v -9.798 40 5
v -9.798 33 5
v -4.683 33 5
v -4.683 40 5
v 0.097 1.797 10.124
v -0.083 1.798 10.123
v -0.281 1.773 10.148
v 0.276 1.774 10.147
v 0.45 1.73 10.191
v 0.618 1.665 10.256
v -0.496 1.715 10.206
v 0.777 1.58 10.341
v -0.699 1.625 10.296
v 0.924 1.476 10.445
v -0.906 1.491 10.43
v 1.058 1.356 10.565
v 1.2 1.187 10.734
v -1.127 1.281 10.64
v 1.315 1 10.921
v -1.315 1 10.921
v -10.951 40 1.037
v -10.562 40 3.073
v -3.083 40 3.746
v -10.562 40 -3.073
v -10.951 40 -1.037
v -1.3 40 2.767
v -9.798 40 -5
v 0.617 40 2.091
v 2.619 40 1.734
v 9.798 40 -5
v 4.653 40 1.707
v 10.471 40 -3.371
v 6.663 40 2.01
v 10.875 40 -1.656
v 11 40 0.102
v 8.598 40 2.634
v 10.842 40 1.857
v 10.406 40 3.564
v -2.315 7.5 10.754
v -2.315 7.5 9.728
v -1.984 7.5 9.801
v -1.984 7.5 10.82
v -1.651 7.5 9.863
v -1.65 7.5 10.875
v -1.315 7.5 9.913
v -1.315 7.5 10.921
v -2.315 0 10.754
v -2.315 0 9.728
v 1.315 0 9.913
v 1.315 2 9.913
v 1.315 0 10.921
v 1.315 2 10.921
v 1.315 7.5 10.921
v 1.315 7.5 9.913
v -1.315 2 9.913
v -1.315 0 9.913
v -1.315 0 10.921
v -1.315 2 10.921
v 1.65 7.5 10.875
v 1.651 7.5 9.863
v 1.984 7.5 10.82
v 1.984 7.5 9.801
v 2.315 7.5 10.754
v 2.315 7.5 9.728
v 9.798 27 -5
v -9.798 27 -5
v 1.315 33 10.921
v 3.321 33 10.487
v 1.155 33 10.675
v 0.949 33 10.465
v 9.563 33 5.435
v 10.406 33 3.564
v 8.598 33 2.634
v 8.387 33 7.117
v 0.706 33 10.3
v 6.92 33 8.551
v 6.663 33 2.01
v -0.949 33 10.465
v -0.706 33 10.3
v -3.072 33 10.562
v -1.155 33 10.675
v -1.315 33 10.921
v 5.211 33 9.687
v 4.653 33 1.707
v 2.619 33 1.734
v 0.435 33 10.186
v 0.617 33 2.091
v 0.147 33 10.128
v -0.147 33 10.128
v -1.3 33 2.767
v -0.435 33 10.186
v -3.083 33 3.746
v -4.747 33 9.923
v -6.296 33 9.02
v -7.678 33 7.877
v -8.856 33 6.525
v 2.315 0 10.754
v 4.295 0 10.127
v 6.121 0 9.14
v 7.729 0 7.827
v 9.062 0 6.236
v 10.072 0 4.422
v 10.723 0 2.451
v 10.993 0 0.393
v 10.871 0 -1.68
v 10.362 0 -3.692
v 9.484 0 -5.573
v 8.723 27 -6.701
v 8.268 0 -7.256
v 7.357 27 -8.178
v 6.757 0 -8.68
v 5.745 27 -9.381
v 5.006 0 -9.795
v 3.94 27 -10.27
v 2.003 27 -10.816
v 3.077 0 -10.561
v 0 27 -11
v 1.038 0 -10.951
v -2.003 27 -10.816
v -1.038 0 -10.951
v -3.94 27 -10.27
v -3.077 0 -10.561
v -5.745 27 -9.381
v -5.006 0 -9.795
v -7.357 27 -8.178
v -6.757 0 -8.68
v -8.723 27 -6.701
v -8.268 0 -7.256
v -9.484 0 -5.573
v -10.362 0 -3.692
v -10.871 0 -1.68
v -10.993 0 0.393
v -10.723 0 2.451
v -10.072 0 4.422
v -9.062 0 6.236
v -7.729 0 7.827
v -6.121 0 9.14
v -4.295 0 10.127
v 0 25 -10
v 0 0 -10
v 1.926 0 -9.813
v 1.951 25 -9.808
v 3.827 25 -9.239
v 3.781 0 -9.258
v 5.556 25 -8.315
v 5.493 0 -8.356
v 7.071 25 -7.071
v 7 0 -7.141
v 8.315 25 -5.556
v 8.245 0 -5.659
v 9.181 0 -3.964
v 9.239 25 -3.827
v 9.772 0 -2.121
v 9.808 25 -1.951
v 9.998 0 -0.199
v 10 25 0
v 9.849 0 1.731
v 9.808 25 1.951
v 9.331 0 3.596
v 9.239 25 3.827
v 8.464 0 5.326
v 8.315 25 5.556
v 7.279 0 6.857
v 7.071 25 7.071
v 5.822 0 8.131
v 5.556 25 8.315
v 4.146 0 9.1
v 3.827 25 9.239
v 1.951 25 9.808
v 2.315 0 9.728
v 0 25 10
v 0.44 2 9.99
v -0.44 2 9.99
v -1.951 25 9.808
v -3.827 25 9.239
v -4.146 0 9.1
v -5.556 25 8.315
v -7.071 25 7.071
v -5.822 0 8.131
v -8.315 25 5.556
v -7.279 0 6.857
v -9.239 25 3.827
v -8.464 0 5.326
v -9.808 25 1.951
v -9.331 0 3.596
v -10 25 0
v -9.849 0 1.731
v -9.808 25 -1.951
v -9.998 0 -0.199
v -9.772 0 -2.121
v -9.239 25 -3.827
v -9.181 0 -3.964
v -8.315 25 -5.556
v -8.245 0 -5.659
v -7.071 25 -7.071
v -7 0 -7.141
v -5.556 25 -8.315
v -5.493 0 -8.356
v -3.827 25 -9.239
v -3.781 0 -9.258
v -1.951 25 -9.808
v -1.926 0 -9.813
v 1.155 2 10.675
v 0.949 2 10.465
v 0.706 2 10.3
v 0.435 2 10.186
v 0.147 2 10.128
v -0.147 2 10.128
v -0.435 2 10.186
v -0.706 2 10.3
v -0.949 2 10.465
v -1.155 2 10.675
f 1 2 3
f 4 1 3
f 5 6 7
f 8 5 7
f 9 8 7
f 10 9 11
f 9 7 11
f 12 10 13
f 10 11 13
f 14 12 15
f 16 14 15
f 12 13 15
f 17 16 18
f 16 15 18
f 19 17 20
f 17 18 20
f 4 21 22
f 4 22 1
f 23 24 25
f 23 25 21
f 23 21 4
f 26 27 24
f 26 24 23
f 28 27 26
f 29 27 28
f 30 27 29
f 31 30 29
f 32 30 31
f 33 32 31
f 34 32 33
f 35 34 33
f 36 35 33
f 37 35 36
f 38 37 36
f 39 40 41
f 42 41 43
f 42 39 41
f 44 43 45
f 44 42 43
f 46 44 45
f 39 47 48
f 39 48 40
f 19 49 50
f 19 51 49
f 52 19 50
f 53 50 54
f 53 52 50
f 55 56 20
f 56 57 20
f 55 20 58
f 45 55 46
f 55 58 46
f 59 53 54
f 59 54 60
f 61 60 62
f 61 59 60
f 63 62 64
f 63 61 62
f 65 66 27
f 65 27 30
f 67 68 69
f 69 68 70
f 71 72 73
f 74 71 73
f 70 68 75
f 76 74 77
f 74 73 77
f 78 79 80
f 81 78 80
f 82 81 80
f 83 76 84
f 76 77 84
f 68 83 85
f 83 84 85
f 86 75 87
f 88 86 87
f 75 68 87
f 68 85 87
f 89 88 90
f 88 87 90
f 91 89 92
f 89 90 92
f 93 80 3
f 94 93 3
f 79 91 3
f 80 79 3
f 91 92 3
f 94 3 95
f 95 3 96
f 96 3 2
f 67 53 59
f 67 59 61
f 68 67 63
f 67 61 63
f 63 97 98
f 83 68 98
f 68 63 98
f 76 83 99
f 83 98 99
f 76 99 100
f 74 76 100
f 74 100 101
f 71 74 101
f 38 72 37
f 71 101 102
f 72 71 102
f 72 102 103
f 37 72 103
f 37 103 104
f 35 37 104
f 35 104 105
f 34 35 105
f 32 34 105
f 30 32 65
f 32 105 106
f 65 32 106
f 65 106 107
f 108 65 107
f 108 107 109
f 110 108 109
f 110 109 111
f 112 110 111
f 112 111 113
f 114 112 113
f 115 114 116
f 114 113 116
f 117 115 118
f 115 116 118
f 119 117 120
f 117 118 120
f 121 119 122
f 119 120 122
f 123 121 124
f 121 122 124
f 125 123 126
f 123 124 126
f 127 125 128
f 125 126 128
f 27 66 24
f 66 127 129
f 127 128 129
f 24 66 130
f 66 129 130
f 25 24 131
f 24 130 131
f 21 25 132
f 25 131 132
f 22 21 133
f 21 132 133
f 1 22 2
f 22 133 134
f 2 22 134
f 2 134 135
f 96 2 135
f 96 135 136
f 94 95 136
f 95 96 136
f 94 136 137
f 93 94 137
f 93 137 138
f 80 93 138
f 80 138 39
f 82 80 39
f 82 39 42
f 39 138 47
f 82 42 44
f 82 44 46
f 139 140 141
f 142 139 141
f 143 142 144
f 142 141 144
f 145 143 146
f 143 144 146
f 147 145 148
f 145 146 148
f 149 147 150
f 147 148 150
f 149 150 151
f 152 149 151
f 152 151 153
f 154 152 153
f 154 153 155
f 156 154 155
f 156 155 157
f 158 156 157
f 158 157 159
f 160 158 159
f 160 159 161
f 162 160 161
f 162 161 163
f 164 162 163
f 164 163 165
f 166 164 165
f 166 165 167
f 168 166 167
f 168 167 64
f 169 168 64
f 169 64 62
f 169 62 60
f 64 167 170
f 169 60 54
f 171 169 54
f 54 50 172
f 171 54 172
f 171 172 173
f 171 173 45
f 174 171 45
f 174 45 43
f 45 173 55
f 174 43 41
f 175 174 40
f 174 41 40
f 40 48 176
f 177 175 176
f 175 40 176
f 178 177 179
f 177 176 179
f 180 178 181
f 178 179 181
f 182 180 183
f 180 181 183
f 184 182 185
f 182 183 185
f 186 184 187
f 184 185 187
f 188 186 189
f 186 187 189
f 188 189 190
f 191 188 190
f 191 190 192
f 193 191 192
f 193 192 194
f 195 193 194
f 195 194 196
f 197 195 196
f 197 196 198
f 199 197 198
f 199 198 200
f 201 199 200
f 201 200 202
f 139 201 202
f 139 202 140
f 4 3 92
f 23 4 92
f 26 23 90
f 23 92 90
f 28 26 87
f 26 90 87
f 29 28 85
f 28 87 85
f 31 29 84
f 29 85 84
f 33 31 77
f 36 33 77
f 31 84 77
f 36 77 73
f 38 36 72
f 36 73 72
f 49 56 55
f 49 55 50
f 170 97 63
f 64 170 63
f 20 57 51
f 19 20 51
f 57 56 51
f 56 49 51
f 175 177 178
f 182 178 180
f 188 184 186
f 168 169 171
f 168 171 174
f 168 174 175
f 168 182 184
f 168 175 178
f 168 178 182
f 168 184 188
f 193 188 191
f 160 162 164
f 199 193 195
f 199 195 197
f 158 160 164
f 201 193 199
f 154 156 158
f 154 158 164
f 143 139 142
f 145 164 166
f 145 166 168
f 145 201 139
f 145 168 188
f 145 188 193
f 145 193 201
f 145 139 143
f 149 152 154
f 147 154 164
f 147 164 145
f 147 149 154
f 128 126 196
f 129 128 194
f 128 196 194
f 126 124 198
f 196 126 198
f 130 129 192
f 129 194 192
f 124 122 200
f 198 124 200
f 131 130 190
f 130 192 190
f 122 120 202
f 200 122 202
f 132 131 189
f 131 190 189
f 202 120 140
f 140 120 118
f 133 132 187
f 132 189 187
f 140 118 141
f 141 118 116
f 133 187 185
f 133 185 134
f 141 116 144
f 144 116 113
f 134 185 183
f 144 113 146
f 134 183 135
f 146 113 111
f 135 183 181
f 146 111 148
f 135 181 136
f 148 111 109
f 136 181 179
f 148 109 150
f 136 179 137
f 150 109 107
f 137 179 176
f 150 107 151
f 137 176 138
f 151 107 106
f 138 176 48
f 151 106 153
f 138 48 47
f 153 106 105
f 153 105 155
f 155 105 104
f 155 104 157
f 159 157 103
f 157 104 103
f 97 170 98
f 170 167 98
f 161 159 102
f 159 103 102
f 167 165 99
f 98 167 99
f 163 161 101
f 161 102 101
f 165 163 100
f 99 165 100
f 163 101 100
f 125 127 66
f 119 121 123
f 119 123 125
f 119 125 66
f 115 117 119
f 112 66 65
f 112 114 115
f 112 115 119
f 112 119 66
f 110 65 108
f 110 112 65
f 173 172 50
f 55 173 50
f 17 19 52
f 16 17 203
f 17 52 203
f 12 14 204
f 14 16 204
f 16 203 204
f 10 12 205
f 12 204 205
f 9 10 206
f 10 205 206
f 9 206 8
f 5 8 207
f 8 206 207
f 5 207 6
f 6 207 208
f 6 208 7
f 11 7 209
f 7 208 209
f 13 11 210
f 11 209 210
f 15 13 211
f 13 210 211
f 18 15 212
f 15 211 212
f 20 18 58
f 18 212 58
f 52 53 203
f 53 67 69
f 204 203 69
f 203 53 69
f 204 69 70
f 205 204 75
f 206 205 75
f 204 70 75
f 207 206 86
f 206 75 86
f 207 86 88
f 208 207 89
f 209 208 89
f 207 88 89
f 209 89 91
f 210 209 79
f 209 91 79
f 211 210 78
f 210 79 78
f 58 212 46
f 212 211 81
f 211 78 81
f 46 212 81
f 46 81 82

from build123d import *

# Parameters (mm, degrees)
SKETCH1_R           = 11
BOSS_EXTRUDE1_DEPTH = 40
CUT_EXTRUDE1_START  = -13
CUT_EXTRUDE1_DEPTH  = 13
CUT_EXTRUDE2_START  = -7
CUT_EXTRUDE2_DEPTH  = 7
CUT_EXTRUDE3_DEPTH  = 37.482872694
SKETCH6_R           = 10
CUT_EXTRUDE4_DEPTH  = 25
SKETCH7_W           = 1
SKETCH7_H           = 7.5
CUT_EXTRUDE5_DEPTH  = 7
SKETCH8_W           = 2.630926858
SKETCH8_H           = 1.007959983
BOSS_EXTRUDE2_DEPTH = 2
CHAMFER1_SIZE       = 1


with BuildPart() as part:
    # Sketch1 → Boss-Extrude1 (new body)
    with BuildSketch(Plane(origin=(0, 0, 0), x_dir=(1, 0, 0), z_dir=(0, 1, 0))):
        with Locations(Location((0, 0, 0), (0, 0, 270))):
            Circle(SKETCH1_R)
    extrude(amount=BOSS_EXTRUDE1_DEPTH)

    # Sketch2 → Cut-Extrude1 (cut)
    with BuildSketch(Plane(origin=(0, 40, 0), x_dir=(1, 0, 0), z_dir=(0, 1, 0)).offset(CUT_EXTRUDE1_START)):
        with BuildLine():
            Line((-9.797958971, 5), (9.797958971, 5))
            ThreePointArc((9.797958971, 5), (0, 11), (-9.797958971, 5))
        make_face()
    extrude(amount=CUT_EXTRUDE1_DEPTH, mode=Mode.SUBTRACT)

    # Sketch3 → Cut-Extrude2 (cut)
    with BuildSketch(Plane(origin=(0, 40, 0), x_dir=(1, 0, 0), z_dir=(0, 1, 0)).offset(CUT_EXTRUDE2_START)):
        with BuildLine():
            Line((-9.797958971, -5), (-4.683015841, -5))
            ThreePointArc((-4.683015841, -5), (2.619314521, -1.734147983), (10.406466307, -3.564471772))
            ThreePointArc((10.406466307, -3.564471772), (0.779586825, -10.972339968), (-9.797958971, -5))
        make_face()
    extrude(amount=CUT_EXTRUDE2_DEPTH, mode=Mode.SUBTRACT)

    # Sketch4 → Cut-Extrude3 (cut, through all)
    with BuildSketch(Plane(origin=(0, 33, 0), x_dir=(1, 0, 0), z_dir=(0, 1, 0))):
        with BuildLine():
            ThreePointArc((1.315463429, -10.921060203), (0, -10.120855836), (-1.315463429, -10.921060203))
            ThreePointArc((-1.315463429, -10.921060203), (0, -11), (1.315463429, -10.921060203))
        make_face()
    extrude(amount=-CUT_EXTRUDE3_DEPTH, mode=Mode.SUBTRACT)

    # Sketch6 → Cut-Extrude4 (cut)
    with BuildSketch(Plane.XZ):
        with Locations(Location((0, 0, 0), (0, 0, 270))):
            Circle(SKETCH6_R)
    extrude(amount=-CUT_EXTRUDE4_DEPTH, mode=Mode.SUBTRACT)

    # Sketch7 → Cut-Extrude5 (cut)
    with BuildSketch(Plane.XY.offset(12)):
        with Locations((-1.815463429, 3.75)):
            Rectangle(SKETCH7_W, SKETCH7_H)
        with Locations((1.815463429, 3.75)):
            Rectangle(SKETCH7_W, SKETCH7_H)
    extrude(amount=-CUT_EXTRUDE5_DEPTH, mode=Mode.SUBTRACT)

    # Sketch8 → Boss-Extrude2 (add)
    with BuildSketch(Plane.XZ):
        with Locations((0, 10.417080212)):
            Rectangle(SKETCH8_W, SKETCH8_H)
    extrude(amount=-BOSS_EXTRUDE2_DEPTH)

    # Chamfer1
    # the kernel refuses this chamfer: 1 mm, written as the material it takes off along each edge
    with BuildSketch(Plane(origin=(-3.887146417, 2, 10.921060203), x_dir=(-9.448986822191204e-15, 0.02749587661058651, -0.9996219169112968), z_dir=(1, 0, 0))) as chamfer1_piece_1_section:
        Polygon((CHAMFER1_SIZE * 0.999621916911, -CHAMFER1_SIZE * 0.0274958766106), (-CHAMFER1_SIZE * 0.0274958766106, -CHAMFER1_SIZE * 0.999621916911), (0, 0), align=None)
    chamfer1_piece_1 = extrude(amount=7.774292833, mode=Mode.PRIVATE)
    chamfer1_piece_1 = chamfer1_piece_1 & Plane(origin=(0, 1.631347526, 11.602209324), x_dir=(0.8880145347419771, 0, -0.45981538261240235), z_dir=(0, 1, 0)) * Cylinder(1.481353488, 20, mode=Mode.PRIVATE)
    add(chamfer1_piece_1, mode=Mode.SUBTRACT)


solid = part.part
